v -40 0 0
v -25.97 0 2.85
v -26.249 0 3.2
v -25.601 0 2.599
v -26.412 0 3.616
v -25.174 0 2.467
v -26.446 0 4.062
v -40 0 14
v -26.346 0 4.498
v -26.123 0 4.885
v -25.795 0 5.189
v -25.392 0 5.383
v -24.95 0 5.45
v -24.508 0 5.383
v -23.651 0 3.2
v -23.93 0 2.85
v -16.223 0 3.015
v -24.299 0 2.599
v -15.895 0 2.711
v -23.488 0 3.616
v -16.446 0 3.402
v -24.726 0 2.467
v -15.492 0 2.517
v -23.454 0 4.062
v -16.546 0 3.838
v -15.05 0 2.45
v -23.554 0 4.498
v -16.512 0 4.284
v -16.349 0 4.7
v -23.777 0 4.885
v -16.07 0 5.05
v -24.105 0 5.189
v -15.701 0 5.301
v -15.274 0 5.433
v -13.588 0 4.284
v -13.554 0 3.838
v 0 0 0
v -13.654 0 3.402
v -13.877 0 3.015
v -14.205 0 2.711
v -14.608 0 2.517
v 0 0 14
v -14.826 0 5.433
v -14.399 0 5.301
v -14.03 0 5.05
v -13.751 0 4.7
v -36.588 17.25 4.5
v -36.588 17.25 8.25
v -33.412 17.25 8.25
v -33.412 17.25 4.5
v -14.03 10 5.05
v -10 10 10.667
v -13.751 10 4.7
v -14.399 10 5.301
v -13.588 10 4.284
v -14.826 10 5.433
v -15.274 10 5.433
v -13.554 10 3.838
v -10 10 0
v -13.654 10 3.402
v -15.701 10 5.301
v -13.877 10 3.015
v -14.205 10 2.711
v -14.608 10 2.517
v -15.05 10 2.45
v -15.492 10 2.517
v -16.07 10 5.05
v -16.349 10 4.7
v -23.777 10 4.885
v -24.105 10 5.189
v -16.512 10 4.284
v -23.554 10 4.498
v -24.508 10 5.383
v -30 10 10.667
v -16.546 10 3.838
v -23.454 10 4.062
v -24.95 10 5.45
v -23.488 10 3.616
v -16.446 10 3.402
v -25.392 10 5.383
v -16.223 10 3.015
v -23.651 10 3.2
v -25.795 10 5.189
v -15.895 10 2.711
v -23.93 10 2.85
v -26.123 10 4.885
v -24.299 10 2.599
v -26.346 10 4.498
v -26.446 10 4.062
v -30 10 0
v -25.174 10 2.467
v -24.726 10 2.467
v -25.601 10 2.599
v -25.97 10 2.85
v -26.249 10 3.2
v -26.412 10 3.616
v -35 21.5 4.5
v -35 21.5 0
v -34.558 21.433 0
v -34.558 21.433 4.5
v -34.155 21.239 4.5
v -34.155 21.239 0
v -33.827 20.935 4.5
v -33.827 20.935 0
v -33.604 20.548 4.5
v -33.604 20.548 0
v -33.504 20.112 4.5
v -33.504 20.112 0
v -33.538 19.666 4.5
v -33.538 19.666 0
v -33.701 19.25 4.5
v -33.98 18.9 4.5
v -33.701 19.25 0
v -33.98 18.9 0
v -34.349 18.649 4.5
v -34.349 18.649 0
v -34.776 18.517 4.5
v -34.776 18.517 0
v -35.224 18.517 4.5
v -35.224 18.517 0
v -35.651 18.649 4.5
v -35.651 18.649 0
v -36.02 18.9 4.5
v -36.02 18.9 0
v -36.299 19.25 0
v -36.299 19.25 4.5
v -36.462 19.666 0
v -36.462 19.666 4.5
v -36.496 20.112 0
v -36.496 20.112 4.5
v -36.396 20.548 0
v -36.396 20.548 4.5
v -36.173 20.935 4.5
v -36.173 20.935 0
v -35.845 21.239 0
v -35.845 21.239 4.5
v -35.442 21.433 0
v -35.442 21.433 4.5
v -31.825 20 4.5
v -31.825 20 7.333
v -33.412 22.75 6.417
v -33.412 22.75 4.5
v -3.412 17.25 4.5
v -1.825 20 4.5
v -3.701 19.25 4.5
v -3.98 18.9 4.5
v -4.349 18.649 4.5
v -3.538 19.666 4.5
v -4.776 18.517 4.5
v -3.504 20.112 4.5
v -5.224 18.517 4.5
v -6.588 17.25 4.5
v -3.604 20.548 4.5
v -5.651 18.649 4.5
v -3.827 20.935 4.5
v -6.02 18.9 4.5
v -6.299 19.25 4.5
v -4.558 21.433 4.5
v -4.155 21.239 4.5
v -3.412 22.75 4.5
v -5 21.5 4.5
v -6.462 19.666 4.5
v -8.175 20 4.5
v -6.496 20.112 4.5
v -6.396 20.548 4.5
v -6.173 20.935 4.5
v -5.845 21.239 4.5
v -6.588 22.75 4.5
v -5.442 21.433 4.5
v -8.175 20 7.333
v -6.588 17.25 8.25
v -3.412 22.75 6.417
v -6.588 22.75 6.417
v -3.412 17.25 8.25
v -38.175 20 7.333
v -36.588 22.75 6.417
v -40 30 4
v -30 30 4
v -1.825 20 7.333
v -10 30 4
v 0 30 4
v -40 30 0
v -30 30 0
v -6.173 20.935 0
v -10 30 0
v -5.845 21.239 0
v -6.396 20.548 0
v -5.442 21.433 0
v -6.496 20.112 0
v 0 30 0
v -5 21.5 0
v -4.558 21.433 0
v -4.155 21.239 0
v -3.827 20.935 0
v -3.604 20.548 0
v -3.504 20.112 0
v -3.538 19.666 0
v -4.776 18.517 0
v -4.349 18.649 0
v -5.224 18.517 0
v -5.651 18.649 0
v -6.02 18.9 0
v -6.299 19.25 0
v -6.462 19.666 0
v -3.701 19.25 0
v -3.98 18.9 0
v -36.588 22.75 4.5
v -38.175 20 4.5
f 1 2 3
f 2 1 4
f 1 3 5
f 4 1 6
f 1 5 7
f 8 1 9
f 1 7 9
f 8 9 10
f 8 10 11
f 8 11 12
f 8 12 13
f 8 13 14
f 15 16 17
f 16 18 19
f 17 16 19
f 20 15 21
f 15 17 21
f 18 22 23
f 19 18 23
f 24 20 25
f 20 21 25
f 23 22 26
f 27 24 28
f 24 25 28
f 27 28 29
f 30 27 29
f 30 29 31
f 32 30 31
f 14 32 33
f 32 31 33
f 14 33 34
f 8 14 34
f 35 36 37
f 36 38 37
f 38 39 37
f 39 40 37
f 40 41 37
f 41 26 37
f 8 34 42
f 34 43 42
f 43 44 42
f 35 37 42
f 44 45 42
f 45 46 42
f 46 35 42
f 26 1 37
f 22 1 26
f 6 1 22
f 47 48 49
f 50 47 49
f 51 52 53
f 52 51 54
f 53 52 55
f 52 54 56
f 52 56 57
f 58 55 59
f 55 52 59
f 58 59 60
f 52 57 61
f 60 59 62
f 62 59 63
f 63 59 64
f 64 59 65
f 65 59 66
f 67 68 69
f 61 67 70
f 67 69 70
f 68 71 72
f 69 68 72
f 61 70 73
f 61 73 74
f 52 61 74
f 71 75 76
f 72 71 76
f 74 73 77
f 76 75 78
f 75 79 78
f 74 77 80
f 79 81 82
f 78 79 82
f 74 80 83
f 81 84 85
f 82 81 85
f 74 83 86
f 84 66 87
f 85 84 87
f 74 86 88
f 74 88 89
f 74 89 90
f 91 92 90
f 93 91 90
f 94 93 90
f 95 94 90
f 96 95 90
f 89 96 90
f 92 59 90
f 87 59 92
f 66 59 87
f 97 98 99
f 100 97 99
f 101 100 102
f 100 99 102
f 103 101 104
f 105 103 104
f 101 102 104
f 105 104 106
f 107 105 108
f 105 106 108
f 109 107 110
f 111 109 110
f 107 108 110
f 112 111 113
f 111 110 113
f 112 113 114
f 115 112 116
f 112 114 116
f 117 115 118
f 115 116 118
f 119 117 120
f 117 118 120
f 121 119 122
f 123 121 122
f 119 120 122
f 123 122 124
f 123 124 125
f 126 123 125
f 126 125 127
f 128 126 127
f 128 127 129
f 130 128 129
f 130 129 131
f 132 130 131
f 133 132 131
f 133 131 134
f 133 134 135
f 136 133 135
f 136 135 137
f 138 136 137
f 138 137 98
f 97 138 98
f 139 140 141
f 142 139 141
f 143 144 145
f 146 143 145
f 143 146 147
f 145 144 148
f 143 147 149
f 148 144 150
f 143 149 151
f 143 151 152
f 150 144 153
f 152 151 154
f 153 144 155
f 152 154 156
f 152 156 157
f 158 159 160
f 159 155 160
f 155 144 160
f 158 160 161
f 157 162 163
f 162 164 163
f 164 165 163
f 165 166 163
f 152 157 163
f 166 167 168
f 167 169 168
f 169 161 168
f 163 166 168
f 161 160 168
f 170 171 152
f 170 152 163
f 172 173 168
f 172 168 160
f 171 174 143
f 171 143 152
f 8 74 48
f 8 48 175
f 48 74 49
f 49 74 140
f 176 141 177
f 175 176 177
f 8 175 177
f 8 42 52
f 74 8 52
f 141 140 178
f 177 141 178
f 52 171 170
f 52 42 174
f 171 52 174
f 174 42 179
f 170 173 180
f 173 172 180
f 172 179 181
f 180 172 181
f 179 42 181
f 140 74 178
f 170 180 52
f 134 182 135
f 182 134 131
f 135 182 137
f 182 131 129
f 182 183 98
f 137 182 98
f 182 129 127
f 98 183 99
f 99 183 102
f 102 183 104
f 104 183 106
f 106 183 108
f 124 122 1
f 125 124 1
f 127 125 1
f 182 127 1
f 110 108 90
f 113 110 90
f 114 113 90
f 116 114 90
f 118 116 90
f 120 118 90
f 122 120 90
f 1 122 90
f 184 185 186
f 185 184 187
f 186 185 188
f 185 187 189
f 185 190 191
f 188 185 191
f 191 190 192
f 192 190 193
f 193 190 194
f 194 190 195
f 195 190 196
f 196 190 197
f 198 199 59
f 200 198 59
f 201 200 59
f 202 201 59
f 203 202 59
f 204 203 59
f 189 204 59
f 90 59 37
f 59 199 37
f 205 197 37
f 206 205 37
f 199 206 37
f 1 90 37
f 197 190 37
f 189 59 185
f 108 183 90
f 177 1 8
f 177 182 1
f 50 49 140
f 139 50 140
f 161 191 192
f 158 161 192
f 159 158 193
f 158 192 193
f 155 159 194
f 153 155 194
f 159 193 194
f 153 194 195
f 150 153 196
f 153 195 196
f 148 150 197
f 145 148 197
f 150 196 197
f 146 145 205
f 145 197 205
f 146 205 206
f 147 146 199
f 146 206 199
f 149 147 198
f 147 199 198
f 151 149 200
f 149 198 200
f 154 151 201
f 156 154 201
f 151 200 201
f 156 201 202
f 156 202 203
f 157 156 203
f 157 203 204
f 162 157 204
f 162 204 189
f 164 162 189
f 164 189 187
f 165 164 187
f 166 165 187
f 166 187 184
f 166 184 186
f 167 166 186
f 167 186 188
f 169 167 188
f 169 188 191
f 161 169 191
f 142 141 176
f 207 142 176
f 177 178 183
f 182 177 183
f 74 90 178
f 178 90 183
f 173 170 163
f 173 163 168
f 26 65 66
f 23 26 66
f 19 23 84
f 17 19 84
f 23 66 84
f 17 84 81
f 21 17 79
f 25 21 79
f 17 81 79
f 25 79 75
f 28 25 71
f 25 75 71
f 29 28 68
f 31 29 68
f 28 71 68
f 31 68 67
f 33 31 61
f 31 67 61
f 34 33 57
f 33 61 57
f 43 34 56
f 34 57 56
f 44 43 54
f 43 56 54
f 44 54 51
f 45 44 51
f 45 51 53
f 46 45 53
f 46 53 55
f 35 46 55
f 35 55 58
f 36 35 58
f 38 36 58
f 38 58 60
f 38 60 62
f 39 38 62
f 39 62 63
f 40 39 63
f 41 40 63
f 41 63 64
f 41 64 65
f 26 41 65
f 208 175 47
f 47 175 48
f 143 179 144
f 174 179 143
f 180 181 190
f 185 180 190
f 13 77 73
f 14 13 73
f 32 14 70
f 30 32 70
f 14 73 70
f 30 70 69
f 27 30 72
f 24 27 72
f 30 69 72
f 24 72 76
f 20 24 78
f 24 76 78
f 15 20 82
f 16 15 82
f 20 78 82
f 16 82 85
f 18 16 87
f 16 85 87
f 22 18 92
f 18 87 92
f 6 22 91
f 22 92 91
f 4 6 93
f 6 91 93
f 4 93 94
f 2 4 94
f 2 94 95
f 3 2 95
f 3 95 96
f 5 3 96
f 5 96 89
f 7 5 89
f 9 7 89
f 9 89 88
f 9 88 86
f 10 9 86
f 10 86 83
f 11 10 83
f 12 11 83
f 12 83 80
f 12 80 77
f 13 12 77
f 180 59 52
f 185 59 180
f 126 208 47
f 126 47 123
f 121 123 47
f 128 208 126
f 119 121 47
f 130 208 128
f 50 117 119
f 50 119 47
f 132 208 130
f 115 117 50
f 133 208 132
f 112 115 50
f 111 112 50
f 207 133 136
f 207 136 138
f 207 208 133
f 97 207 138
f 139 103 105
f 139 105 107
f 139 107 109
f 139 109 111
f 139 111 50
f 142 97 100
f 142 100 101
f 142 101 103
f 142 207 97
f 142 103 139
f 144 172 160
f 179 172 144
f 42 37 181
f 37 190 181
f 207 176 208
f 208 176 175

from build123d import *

# Parameters (mm, degrees)
EXTRUDE1_DEPTH = 40
SKETCH2_W      = 20
SKETCH2_H      = 20
EXTRUDE2_DEPTH = 52.923019943
SKETCH3_R      = 1.5
EXTRUDE3_DEPTH = 52.923019943
SKETCH4_R      = 1.5
EXTRUDE4_DEPTH = 47.861498055
EXTRUDE5_DEPTH = 9.5


with BuildPart() as part:
    # Sketch1 → Extrude1 (new body)
    with BuildSketch(Plane(origin=(0, 0, 0), x_dir=(0, 0, -1), z_dir=(1, 0, 0))):
        Polygon((0, 0), (-14, 0), (-4, 30), (0, 30), align=None)
    extrude(amount=-EXTRUDE1_DEPTH)

    # Sketch2 → Extrude2 (cut, through all)
    with BuildSketch(Plane(origin=(0, 0, 0), x_dir=(-1, 0, 0), z_dir=(0, 0, -1))):
        with Locations((20, 20)):
            Rectangle(SKETCH2_W, SKETCH2_H)
    extrude(amount=-EXTRUDE2_DEPTH, mode=Mode.SUBTRACT)

    # Sketch3 → Extrude3 (cut, through all)
    with BuildSketch(Plane(origin=(0, 0, 0), x_dir=(-1, 0, 0), z_dir=(0, 0, -1))):
        with Locations(Location((5, 20, 0), (0, 0, 90))):
            Circle(SKETCH3_R)
        with Locations(Location((35, 20, 0), (0, 0, 90))):
            Circle(SKETCH3_R)
    extrude(amount=-EXTRUDE3_DEPTH, mode=Mode.SUBTRACT)

    # Sketch4 → Extrude4 (cut, through all)
    with BuildSketch(Plane(origin=(0, 10, 0), x_dir=(1, 0, 0), z_dir=(0, 1, 0))):
        with Locations(Location((-24.95, -3.95, 0), (0, 0, 270))):
            Circle(SKETCH4_R)
        with Locations(Location((-15.05, -3.95, 0), (0, 0, 90))):
            Circle(SKETCH4_R)
    extrude(amount=-EXTRUDE4_DEPTH, mode=Mode.SUBTRACT)

    # Sketch8 → Extrude5 (cut)
    with BuildSketch(Plane(origin=(0, 0, 14), x_dir=(-1, 0, 0), z_dir=(0, 0, -1))):
        Polygon((6.58771324, 17.25), (8.175426481, 20), (6.58771324, 22.75), (3.41228676, 22.75), (1.824573519, 20), (3.41228676, 17.25), align=None)
        Polygon((36.58771324, 17.25), (33.41228676, 17.25), (31.824573519, 20), (33.41228676, 22.75), (36.58771324, 22.75), (38.175426481, 20), align=None)
    extrude(amount=EXTRUDE5_DEPTH, mode=Mode.SUBTRACT)


solid = part.part
